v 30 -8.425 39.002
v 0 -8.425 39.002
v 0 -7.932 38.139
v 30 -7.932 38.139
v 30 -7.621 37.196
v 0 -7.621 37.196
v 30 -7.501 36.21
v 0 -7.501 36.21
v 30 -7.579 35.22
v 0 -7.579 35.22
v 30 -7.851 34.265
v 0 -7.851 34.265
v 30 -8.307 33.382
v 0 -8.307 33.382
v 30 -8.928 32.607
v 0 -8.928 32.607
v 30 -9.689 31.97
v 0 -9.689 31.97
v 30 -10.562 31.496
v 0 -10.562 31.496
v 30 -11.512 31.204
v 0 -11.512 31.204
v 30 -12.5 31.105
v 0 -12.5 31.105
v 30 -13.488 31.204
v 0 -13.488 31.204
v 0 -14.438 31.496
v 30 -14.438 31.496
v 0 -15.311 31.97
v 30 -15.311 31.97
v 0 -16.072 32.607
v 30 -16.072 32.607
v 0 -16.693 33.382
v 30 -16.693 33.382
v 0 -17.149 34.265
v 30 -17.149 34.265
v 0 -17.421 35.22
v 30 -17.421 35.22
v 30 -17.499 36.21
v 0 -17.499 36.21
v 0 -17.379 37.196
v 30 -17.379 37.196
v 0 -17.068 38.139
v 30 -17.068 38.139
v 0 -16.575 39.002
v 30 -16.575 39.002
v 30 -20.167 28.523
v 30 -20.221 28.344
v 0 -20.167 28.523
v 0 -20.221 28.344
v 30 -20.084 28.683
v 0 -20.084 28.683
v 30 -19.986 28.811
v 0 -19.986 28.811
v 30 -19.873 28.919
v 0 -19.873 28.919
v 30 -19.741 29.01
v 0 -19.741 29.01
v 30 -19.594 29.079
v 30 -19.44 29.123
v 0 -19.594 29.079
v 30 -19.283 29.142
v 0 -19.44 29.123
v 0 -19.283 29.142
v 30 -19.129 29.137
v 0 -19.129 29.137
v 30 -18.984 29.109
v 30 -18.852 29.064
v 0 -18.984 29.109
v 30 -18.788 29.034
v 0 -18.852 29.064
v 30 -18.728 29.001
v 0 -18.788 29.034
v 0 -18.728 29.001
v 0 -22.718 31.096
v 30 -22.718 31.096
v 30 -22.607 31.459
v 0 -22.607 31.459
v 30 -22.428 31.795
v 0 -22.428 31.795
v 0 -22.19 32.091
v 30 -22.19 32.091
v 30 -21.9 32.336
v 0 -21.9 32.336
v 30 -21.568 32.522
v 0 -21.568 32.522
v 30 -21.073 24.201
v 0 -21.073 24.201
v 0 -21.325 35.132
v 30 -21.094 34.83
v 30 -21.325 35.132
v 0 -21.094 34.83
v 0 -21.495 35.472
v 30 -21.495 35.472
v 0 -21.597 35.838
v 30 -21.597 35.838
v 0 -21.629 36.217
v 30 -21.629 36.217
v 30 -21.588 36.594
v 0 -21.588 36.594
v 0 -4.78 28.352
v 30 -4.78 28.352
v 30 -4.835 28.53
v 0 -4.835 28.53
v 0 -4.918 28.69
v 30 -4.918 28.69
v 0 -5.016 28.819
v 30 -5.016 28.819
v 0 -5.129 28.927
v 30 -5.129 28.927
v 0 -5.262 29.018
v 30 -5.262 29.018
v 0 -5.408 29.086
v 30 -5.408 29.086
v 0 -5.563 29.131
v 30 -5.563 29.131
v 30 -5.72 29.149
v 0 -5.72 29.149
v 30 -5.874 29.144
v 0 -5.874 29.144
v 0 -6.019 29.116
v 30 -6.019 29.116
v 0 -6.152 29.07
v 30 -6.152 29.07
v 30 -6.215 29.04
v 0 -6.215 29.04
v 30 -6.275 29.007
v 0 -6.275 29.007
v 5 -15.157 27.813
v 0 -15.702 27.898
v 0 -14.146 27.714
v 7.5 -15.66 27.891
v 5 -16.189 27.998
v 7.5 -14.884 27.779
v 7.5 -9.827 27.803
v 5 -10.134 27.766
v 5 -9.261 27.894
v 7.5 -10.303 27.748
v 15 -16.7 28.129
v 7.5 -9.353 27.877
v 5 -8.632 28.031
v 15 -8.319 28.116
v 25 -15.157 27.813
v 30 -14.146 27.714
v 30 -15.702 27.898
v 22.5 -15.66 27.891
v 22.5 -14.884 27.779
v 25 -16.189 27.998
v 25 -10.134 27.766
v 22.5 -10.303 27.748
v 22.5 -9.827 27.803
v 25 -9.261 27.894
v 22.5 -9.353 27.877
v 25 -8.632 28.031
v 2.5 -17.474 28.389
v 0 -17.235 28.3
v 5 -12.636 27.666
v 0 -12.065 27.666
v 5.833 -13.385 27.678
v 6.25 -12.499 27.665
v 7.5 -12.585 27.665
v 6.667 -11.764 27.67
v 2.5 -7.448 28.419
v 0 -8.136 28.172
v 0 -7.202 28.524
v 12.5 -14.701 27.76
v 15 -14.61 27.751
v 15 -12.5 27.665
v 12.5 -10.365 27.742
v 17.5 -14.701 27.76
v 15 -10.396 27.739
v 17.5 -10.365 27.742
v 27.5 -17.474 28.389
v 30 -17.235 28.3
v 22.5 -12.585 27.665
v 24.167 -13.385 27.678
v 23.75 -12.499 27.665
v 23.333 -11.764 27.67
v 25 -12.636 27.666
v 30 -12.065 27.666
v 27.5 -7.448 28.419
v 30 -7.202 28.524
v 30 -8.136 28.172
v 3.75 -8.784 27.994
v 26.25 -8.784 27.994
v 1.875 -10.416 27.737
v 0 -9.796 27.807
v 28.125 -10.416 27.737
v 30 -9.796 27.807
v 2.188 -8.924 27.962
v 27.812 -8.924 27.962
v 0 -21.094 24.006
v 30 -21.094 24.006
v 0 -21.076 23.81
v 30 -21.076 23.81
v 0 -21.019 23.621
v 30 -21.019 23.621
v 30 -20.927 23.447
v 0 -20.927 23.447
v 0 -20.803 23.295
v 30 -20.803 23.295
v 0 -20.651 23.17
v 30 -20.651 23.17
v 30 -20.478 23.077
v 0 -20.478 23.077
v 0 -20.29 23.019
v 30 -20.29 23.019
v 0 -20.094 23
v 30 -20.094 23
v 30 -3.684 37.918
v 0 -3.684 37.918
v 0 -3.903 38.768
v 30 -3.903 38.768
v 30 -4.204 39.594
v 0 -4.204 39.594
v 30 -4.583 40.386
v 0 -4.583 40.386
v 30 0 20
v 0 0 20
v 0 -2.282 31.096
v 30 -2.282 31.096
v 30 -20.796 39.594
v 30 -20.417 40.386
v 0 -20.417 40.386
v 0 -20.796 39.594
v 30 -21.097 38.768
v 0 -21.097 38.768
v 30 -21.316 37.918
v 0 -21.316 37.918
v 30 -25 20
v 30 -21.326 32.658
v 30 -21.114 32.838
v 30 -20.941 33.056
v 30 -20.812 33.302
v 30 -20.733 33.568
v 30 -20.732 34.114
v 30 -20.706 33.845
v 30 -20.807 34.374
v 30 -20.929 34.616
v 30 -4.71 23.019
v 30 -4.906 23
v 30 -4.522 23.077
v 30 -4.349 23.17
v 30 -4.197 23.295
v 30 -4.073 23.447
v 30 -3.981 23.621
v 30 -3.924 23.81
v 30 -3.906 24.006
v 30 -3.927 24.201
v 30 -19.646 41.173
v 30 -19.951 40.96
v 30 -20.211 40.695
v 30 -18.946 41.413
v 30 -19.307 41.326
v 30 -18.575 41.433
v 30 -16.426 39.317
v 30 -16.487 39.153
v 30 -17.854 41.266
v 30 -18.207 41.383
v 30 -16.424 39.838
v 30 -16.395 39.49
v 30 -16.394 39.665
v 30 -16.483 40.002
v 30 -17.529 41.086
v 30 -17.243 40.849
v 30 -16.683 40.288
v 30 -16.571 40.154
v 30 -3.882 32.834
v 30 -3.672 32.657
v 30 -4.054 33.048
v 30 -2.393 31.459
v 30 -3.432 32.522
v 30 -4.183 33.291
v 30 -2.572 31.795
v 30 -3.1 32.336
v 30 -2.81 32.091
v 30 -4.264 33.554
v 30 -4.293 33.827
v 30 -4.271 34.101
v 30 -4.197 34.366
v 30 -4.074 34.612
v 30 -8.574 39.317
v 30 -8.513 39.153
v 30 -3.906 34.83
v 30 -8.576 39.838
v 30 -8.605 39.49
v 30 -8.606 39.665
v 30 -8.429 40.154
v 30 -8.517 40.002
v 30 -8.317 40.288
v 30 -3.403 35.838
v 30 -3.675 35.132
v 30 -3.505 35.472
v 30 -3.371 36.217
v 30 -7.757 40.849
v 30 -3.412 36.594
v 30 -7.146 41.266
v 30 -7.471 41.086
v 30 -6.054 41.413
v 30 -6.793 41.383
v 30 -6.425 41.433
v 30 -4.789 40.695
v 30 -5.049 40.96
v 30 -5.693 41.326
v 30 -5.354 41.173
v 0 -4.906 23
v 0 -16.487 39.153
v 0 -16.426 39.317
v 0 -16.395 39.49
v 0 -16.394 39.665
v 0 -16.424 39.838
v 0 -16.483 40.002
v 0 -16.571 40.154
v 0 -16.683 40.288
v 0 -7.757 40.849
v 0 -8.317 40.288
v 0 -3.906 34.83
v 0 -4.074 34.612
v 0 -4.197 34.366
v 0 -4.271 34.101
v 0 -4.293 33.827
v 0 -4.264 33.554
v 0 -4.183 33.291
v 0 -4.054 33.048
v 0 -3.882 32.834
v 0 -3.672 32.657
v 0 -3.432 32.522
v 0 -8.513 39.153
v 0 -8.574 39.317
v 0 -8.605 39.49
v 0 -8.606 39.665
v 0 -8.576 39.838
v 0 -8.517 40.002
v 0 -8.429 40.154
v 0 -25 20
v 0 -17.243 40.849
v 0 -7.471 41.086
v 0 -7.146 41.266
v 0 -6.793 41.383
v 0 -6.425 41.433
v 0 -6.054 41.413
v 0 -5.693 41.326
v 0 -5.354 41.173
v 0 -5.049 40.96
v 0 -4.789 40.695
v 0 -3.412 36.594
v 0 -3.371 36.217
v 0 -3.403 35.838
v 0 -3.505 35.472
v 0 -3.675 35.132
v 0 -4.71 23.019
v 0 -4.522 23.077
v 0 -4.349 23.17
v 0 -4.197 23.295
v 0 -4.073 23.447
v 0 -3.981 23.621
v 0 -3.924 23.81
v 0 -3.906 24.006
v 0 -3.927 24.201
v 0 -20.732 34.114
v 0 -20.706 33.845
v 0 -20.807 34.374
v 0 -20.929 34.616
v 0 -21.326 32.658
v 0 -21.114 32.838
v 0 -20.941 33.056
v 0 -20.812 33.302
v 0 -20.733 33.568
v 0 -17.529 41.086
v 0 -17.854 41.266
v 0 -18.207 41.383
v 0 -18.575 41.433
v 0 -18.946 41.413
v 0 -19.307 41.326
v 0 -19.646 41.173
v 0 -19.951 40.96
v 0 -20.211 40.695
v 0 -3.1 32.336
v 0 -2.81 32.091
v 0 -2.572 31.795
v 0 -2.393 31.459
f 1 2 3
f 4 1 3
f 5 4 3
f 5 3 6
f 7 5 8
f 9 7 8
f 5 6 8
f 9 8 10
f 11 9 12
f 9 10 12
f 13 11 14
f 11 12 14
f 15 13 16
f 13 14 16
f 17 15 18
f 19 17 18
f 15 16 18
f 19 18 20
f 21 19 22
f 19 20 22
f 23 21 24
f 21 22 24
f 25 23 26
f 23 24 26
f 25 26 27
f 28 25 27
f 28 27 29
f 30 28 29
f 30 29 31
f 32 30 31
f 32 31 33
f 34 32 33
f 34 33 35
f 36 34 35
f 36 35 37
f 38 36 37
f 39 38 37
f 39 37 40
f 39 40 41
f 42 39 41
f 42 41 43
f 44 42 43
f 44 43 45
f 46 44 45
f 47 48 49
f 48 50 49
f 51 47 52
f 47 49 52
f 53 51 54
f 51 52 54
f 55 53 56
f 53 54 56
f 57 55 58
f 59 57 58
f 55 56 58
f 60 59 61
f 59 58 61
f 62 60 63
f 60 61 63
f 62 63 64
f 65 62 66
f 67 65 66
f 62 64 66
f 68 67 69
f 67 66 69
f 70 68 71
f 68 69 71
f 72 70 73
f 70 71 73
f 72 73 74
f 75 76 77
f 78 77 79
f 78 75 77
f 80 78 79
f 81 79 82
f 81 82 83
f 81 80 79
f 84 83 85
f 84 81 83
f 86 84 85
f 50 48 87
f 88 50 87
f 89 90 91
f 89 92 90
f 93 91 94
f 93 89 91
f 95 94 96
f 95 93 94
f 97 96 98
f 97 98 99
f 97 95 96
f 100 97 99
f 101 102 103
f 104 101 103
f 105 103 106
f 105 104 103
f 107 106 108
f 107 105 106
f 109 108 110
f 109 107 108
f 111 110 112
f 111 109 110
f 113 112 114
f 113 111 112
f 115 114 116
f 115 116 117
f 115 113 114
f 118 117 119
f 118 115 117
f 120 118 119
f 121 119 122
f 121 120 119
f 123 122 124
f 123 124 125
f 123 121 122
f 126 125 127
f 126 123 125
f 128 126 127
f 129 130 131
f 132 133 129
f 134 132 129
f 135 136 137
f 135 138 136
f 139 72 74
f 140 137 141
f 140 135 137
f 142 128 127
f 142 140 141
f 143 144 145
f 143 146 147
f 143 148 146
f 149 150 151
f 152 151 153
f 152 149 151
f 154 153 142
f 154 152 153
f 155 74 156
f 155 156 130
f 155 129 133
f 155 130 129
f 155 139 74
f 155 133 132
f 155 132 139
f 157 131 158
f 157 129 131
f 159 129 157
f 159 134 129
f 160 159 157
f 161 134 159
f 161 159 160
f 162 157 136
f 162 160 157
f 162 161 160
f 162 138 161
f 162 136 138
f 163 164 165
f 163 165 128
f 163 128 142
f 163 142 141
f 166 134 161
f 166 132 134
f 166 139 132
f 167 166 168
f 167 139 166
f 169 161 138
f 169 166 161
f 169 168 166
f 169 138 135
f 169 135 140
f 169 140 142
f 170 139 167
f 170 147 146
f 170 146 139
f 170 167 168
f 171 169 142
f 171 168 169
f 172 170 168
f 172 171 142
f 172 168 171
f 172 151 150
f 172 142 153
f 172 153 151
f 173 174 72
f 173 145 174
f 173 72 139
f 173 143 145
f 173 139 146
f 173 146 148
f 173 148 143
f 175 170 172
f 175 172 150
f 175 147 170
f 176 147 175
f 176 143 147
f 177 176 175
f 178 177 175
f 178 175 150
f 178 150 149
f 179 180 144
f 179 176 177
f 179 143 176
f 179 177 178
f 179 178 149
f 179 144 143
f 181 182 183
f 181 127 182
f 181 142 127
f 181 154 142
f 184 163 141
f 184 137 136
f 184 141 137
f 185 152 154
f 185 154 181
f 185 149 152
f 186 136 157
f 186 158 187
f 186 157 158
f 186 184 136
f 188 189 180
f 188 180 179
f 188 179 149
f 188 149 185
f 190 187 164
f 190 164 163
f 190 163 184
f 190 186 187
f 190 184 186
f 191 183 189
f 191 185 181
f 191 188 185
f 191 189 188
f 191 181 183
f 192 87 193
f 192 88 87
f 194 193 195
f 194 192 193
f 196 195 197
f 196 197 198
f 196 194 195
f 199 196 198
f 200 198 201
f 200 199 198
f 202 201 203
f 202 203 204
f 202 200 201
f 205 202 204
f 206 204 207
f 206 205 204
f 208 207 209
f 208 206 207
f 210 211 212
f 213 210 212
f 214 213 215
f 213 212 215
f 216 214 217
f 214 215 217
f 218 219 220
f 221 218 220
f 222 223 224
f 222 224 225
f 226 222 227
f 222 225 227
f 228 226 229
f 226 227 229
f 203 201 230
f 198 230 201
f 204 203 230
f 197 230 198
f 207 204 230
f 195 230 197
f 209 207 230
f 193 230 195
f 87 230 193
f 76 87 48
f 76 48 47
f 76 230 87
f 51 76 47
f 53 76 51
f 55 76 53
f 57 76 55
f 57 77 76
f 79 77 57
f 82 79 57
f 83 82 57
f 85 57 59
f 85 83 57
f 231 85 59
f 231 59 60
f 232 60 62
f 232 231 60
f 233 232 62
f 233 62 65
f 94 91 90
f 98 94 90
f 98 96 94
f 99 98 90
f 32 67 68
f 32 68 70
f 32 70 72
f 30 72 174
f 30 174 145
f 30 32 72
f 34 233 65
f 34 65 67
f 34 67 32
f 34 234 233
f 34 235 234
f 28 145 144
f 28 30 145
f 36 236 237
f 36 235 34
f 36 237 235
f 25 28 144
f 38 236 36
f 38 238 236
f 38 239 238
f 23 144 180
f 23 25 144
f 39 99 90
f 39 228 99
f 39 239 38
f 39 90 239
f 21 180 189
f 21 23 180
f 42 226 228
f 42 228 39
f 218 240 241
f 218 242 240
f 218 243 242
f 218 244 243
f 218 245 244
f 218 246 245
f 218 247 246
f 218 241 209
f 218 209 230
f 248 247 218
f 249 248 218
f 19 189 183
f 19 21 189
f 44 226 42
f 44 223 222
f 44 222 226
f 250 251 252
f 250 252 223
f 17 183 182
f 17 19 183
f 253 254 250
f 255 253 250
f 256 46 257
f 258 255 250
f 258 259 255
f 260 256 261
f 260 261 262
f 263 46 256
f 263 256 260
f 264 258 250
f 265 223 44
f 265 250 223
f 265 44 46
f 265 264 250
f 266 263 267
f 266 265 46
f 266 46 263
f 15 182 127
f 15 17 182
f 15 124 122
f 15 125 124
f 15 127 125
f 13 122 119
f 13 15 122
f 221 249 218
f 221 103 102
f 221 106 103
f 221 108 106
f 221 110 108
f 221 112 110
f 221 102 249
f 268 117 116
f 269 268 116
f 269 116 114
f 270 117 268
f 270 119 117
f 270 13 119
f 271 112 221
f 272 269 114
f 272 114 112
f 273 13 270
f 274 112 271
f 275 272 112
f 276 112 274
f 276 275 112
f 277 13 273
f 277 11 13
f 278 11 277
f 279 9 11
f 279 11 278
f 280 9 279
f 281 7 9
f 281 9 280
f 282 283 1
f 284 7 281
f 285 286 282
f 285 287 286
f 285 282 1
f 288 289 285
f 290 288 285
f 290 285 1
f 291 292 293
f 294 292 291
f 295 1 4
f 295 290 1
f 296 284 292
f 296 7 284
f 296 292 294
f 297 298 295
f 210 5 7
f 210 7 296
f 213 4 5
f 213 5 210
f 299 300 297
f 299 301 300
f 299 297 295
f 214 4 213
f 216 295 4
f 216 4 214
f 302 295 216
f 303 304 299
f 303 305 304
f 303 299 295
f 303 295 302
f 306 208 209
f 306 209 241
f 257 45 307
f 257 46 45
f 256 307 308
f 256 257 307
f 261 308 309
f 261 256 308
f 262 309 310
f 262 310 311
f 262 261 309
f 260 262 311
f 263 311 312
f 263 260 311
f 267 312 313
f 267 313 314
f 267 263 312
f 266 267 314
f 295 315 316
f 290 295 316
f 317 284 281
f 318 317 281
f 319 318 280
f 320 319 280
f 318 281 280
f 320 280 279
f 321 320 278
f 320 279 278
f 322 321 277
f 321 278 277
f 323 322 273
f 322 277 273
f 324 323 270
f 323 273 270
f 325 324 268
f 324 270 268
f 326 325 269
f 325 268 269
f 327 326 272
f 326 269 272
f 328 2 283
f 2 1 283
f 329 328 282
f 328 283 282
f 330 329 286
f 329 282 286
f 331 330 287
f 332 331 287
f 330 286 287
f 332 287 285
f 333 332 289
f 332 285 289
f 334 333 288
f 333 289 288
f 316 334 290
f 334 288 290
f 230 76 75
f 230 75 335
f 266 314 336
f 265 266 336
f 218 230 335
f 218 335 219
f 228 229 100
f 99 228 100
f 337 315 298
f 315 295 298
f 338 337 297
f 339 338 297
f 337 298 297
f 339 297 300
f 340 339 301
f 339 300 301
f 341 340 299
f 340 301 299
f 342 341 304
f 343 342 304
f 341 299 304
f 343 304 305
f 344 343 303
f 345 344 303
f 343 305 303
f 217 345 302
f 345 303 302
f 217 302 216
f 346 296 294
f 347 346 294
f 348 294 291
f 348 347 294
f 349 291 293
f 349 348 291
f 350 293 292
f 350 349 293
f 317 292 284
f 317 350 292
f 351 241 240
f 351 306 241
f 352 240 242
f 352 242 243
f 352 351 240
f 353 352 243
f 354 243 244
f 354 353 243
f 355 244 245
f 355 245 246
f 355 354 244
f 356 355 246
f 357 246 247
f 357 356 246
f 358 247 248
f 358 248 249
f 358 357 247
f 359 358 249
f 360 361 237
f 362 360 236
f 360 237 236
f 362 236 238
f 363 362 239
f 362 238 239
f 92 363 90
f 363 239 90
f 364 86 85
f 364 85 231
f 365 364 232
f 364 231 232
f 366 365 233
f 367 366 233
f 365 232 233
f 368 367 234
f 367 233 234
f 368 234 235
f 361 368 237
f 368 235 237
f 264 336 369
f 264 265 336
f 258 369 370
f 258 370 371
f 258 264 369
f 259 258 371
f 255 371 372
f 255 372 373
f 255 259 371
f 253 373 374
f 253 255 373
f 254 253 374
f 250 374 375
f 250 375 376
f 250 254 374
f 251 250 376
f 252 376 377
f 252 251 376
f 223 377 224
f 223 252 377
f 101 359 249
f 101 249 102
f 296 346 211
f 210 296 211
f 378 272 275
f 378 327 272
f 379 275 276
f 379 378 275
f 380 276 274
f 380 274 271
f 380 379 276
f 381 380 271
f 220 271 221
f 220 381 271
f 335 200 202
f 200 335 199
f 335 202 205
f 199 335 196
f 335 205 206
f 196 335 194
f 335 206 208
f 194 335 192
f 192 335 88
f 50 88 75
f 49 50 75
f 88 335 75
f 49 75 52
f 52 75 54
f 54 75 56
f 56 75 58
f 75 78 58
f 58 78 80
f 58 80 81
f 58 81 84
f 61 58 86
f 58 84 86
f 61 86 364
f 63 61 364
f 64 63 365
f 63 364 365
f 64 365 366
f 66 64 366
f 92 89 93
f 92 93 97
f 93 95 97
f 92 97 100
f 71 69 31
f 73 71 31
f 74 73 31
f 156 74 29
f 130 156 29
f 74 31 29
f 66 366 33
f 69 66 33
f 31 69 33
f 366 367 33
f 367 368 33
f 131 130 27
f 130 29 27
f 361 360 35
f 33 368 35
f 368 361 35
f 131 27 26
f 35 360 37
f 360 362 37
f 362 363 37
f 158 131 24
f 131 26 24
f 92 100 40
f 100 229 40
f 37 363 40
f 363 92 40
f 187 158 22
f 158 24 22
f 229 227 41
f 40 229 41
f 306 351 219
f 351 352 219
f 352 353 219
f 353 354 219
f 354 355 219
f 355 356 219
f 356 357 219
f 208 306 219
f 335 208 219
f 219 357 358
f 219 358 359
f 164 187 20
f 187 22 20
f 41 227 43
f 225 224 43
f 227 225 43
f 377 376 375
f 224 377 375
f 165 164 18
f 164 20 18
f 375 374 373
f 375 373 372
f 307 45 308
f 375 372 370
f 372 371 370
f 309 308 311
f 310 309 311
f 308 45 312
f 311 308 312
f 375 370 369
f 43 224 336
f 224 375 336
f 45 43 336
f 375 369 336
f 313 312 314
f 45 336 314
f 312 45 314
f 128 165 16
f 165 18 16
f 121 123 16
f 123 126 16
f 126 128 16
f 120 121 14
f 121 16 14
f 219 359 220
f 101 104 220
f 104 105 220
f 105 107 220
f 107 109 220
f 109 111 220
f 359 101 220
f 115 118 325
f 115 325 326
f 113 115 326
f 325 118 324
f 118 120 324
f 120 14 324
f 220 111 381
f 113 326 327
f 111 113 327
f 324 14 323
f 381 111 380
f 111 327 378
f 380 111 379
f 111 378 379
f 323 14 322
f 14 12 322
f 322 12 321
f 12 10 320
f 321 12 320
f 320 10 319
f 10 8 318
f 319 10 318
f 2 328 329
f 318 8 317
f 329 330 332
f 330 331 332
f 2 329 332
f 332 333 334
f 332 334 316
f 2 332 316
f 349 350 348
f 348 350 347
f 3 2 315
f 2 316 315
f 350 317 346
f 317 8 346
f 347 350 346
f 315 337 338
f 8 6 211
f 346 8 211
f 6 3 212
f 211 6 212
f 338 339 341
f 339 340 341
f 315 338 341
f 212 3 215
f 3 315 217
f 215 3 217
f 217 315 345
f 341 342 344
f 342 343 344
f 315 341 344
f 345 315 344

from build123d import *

# Parameters (mm, degrees)
F1_DEPTH = 30
F2_R     = 1
F3_R     = 2
F5_DEPTH = 30
F6_R     = 1
F8_DEPTH = 30
F9_R     = 2


with BuildPart() as f1:
    # F0 (on Right) → F1 (new body)
    with BuildSketch(Plane.YZ):
        with BuildLine():
            ThreePointArc((-8.9644660941, 39.6406786749), (-12.5, 31.105144769), (-16.0355339059, 39.6406786749))
            Line((-16.0355339059, 39.6406786749), (-18.8639610307, 42.4691057996))
            ThreePointArc((-18.8639610307, 42.4691057996), (-20.4235610781, 40.373303604), (-21.3155532551, 37.9178832515))
            Line((-21.3155532551, 37.9178832515), (-25, 20))
            Line((-25, 20), (0, 20))
            Line((0, 20), (-3.6844467449, 37.9178832515))
            ThreePointArc((-3.6844467449, 37.9178832515), (-4.5764389219, 40.373303604), (-6.1360389693, 42.4691057996))
            Line((-6.1360389693, 42.4691057996), (-8.9644660941, 39.6406786749))
        make_face()
    extrude(amount=F1_DEPTH)

    # F2
    f2_edges = [f1.edges().sort_by_distance(p)[0] for p in [
        (15, -8.964466, 39.640679),
        (15, -16.035534, 39.640679),
    ]]
    fillet(f2_edges, radius=F2_R)

    # F3
    f3_edges = [f1.edges().sort_by_distance(p)[0] for p in [
        (15, -6.136039, 42.469106),
        (15, -18.863961, 42.469106),
    ]]
    fillet(f3_edges, radius=F3_R)

    # F4 (on face) → F5 (cut, through all)
    with BuildSketch(Plane.YZ.offset(30)):
        with BuildLine():
            Line((-19.910434928, 29.8565414207), (-21.3203426366, 23))
            Line((-21.3203426366, 23), (-3.6796573634, 23))
            Line((-3.6796573634, 23), (-5.089565072, 29.8565414207))
            add(Edge.make_bspline(
                [(-19.910434928, 29.8565414207), (-17.6130099069, 27.8782596362), (-12.4507025539, 27.4679496916), (-7.4855849853, 27.8458202643), (-5.089565072, 29.8565414207)],
                knots=[0, 0, 0, 0, 0.5, 1, 1, 1, 1], degree=3))
        make_face()
    extrude(amount=-F5_DEPTH, mode=Mode.SUBTRACT)

    # F6
    f6_edges = [f1.edges().sort_by_distance(p)[0] for p in [
        (15, -21.320343, 23),
        (15, -19.910435, 29.856541),
        (15, -3.679657, 23),
        (15, -5.089565, 29.856541),
    ]]
    fillet(f6_edges, radius=F6_R)

    # F7 (on face) → F8 (cut, through all)
    with BuildSketch(Plane.YZ.offset(30)):
        with BuildLine():
            ThreePointArc((-3.1383199654, 35.2620066566), (-4.2638904774, 33.5537090418), (-2.5555928626, 32.4281385298))
            Line((-2.5555928626, 32.4281385298), (-3.1383199654, 35.2620066566))
        make_face()
        with BuildLine():
            ThreePointArc((-22.4444071374, 32.4281385298), (-21.2389555005, 32.7238956084), (-20.7064631841, 33.8450725932))
            ThreePointArc((-20.7064631841, 33.8450725932), (-21.0318666012, 34.7591606787), (-21.8616800346, 35.2620066566))
            Line((-21.8616800346, 35.2620066566), (-22.4444071374, 32.4281385298))
        make_face()
    extrude(amount=-F8_DEPTH, mode=Mode.SUBTRACT)

    # F9
    f9_edges = [f1.edges().sort_by_distance(p)[0] for p in [
        (15, -21.86168, 35.262007),
        (15, -22.444407, 32.428139),
        (15, -3.13832, 35.262007),
        (15, -2.555593, 32.428139),
    ]]
    fillet(f9_edges, radius=F9_R)


solid = f1.part
